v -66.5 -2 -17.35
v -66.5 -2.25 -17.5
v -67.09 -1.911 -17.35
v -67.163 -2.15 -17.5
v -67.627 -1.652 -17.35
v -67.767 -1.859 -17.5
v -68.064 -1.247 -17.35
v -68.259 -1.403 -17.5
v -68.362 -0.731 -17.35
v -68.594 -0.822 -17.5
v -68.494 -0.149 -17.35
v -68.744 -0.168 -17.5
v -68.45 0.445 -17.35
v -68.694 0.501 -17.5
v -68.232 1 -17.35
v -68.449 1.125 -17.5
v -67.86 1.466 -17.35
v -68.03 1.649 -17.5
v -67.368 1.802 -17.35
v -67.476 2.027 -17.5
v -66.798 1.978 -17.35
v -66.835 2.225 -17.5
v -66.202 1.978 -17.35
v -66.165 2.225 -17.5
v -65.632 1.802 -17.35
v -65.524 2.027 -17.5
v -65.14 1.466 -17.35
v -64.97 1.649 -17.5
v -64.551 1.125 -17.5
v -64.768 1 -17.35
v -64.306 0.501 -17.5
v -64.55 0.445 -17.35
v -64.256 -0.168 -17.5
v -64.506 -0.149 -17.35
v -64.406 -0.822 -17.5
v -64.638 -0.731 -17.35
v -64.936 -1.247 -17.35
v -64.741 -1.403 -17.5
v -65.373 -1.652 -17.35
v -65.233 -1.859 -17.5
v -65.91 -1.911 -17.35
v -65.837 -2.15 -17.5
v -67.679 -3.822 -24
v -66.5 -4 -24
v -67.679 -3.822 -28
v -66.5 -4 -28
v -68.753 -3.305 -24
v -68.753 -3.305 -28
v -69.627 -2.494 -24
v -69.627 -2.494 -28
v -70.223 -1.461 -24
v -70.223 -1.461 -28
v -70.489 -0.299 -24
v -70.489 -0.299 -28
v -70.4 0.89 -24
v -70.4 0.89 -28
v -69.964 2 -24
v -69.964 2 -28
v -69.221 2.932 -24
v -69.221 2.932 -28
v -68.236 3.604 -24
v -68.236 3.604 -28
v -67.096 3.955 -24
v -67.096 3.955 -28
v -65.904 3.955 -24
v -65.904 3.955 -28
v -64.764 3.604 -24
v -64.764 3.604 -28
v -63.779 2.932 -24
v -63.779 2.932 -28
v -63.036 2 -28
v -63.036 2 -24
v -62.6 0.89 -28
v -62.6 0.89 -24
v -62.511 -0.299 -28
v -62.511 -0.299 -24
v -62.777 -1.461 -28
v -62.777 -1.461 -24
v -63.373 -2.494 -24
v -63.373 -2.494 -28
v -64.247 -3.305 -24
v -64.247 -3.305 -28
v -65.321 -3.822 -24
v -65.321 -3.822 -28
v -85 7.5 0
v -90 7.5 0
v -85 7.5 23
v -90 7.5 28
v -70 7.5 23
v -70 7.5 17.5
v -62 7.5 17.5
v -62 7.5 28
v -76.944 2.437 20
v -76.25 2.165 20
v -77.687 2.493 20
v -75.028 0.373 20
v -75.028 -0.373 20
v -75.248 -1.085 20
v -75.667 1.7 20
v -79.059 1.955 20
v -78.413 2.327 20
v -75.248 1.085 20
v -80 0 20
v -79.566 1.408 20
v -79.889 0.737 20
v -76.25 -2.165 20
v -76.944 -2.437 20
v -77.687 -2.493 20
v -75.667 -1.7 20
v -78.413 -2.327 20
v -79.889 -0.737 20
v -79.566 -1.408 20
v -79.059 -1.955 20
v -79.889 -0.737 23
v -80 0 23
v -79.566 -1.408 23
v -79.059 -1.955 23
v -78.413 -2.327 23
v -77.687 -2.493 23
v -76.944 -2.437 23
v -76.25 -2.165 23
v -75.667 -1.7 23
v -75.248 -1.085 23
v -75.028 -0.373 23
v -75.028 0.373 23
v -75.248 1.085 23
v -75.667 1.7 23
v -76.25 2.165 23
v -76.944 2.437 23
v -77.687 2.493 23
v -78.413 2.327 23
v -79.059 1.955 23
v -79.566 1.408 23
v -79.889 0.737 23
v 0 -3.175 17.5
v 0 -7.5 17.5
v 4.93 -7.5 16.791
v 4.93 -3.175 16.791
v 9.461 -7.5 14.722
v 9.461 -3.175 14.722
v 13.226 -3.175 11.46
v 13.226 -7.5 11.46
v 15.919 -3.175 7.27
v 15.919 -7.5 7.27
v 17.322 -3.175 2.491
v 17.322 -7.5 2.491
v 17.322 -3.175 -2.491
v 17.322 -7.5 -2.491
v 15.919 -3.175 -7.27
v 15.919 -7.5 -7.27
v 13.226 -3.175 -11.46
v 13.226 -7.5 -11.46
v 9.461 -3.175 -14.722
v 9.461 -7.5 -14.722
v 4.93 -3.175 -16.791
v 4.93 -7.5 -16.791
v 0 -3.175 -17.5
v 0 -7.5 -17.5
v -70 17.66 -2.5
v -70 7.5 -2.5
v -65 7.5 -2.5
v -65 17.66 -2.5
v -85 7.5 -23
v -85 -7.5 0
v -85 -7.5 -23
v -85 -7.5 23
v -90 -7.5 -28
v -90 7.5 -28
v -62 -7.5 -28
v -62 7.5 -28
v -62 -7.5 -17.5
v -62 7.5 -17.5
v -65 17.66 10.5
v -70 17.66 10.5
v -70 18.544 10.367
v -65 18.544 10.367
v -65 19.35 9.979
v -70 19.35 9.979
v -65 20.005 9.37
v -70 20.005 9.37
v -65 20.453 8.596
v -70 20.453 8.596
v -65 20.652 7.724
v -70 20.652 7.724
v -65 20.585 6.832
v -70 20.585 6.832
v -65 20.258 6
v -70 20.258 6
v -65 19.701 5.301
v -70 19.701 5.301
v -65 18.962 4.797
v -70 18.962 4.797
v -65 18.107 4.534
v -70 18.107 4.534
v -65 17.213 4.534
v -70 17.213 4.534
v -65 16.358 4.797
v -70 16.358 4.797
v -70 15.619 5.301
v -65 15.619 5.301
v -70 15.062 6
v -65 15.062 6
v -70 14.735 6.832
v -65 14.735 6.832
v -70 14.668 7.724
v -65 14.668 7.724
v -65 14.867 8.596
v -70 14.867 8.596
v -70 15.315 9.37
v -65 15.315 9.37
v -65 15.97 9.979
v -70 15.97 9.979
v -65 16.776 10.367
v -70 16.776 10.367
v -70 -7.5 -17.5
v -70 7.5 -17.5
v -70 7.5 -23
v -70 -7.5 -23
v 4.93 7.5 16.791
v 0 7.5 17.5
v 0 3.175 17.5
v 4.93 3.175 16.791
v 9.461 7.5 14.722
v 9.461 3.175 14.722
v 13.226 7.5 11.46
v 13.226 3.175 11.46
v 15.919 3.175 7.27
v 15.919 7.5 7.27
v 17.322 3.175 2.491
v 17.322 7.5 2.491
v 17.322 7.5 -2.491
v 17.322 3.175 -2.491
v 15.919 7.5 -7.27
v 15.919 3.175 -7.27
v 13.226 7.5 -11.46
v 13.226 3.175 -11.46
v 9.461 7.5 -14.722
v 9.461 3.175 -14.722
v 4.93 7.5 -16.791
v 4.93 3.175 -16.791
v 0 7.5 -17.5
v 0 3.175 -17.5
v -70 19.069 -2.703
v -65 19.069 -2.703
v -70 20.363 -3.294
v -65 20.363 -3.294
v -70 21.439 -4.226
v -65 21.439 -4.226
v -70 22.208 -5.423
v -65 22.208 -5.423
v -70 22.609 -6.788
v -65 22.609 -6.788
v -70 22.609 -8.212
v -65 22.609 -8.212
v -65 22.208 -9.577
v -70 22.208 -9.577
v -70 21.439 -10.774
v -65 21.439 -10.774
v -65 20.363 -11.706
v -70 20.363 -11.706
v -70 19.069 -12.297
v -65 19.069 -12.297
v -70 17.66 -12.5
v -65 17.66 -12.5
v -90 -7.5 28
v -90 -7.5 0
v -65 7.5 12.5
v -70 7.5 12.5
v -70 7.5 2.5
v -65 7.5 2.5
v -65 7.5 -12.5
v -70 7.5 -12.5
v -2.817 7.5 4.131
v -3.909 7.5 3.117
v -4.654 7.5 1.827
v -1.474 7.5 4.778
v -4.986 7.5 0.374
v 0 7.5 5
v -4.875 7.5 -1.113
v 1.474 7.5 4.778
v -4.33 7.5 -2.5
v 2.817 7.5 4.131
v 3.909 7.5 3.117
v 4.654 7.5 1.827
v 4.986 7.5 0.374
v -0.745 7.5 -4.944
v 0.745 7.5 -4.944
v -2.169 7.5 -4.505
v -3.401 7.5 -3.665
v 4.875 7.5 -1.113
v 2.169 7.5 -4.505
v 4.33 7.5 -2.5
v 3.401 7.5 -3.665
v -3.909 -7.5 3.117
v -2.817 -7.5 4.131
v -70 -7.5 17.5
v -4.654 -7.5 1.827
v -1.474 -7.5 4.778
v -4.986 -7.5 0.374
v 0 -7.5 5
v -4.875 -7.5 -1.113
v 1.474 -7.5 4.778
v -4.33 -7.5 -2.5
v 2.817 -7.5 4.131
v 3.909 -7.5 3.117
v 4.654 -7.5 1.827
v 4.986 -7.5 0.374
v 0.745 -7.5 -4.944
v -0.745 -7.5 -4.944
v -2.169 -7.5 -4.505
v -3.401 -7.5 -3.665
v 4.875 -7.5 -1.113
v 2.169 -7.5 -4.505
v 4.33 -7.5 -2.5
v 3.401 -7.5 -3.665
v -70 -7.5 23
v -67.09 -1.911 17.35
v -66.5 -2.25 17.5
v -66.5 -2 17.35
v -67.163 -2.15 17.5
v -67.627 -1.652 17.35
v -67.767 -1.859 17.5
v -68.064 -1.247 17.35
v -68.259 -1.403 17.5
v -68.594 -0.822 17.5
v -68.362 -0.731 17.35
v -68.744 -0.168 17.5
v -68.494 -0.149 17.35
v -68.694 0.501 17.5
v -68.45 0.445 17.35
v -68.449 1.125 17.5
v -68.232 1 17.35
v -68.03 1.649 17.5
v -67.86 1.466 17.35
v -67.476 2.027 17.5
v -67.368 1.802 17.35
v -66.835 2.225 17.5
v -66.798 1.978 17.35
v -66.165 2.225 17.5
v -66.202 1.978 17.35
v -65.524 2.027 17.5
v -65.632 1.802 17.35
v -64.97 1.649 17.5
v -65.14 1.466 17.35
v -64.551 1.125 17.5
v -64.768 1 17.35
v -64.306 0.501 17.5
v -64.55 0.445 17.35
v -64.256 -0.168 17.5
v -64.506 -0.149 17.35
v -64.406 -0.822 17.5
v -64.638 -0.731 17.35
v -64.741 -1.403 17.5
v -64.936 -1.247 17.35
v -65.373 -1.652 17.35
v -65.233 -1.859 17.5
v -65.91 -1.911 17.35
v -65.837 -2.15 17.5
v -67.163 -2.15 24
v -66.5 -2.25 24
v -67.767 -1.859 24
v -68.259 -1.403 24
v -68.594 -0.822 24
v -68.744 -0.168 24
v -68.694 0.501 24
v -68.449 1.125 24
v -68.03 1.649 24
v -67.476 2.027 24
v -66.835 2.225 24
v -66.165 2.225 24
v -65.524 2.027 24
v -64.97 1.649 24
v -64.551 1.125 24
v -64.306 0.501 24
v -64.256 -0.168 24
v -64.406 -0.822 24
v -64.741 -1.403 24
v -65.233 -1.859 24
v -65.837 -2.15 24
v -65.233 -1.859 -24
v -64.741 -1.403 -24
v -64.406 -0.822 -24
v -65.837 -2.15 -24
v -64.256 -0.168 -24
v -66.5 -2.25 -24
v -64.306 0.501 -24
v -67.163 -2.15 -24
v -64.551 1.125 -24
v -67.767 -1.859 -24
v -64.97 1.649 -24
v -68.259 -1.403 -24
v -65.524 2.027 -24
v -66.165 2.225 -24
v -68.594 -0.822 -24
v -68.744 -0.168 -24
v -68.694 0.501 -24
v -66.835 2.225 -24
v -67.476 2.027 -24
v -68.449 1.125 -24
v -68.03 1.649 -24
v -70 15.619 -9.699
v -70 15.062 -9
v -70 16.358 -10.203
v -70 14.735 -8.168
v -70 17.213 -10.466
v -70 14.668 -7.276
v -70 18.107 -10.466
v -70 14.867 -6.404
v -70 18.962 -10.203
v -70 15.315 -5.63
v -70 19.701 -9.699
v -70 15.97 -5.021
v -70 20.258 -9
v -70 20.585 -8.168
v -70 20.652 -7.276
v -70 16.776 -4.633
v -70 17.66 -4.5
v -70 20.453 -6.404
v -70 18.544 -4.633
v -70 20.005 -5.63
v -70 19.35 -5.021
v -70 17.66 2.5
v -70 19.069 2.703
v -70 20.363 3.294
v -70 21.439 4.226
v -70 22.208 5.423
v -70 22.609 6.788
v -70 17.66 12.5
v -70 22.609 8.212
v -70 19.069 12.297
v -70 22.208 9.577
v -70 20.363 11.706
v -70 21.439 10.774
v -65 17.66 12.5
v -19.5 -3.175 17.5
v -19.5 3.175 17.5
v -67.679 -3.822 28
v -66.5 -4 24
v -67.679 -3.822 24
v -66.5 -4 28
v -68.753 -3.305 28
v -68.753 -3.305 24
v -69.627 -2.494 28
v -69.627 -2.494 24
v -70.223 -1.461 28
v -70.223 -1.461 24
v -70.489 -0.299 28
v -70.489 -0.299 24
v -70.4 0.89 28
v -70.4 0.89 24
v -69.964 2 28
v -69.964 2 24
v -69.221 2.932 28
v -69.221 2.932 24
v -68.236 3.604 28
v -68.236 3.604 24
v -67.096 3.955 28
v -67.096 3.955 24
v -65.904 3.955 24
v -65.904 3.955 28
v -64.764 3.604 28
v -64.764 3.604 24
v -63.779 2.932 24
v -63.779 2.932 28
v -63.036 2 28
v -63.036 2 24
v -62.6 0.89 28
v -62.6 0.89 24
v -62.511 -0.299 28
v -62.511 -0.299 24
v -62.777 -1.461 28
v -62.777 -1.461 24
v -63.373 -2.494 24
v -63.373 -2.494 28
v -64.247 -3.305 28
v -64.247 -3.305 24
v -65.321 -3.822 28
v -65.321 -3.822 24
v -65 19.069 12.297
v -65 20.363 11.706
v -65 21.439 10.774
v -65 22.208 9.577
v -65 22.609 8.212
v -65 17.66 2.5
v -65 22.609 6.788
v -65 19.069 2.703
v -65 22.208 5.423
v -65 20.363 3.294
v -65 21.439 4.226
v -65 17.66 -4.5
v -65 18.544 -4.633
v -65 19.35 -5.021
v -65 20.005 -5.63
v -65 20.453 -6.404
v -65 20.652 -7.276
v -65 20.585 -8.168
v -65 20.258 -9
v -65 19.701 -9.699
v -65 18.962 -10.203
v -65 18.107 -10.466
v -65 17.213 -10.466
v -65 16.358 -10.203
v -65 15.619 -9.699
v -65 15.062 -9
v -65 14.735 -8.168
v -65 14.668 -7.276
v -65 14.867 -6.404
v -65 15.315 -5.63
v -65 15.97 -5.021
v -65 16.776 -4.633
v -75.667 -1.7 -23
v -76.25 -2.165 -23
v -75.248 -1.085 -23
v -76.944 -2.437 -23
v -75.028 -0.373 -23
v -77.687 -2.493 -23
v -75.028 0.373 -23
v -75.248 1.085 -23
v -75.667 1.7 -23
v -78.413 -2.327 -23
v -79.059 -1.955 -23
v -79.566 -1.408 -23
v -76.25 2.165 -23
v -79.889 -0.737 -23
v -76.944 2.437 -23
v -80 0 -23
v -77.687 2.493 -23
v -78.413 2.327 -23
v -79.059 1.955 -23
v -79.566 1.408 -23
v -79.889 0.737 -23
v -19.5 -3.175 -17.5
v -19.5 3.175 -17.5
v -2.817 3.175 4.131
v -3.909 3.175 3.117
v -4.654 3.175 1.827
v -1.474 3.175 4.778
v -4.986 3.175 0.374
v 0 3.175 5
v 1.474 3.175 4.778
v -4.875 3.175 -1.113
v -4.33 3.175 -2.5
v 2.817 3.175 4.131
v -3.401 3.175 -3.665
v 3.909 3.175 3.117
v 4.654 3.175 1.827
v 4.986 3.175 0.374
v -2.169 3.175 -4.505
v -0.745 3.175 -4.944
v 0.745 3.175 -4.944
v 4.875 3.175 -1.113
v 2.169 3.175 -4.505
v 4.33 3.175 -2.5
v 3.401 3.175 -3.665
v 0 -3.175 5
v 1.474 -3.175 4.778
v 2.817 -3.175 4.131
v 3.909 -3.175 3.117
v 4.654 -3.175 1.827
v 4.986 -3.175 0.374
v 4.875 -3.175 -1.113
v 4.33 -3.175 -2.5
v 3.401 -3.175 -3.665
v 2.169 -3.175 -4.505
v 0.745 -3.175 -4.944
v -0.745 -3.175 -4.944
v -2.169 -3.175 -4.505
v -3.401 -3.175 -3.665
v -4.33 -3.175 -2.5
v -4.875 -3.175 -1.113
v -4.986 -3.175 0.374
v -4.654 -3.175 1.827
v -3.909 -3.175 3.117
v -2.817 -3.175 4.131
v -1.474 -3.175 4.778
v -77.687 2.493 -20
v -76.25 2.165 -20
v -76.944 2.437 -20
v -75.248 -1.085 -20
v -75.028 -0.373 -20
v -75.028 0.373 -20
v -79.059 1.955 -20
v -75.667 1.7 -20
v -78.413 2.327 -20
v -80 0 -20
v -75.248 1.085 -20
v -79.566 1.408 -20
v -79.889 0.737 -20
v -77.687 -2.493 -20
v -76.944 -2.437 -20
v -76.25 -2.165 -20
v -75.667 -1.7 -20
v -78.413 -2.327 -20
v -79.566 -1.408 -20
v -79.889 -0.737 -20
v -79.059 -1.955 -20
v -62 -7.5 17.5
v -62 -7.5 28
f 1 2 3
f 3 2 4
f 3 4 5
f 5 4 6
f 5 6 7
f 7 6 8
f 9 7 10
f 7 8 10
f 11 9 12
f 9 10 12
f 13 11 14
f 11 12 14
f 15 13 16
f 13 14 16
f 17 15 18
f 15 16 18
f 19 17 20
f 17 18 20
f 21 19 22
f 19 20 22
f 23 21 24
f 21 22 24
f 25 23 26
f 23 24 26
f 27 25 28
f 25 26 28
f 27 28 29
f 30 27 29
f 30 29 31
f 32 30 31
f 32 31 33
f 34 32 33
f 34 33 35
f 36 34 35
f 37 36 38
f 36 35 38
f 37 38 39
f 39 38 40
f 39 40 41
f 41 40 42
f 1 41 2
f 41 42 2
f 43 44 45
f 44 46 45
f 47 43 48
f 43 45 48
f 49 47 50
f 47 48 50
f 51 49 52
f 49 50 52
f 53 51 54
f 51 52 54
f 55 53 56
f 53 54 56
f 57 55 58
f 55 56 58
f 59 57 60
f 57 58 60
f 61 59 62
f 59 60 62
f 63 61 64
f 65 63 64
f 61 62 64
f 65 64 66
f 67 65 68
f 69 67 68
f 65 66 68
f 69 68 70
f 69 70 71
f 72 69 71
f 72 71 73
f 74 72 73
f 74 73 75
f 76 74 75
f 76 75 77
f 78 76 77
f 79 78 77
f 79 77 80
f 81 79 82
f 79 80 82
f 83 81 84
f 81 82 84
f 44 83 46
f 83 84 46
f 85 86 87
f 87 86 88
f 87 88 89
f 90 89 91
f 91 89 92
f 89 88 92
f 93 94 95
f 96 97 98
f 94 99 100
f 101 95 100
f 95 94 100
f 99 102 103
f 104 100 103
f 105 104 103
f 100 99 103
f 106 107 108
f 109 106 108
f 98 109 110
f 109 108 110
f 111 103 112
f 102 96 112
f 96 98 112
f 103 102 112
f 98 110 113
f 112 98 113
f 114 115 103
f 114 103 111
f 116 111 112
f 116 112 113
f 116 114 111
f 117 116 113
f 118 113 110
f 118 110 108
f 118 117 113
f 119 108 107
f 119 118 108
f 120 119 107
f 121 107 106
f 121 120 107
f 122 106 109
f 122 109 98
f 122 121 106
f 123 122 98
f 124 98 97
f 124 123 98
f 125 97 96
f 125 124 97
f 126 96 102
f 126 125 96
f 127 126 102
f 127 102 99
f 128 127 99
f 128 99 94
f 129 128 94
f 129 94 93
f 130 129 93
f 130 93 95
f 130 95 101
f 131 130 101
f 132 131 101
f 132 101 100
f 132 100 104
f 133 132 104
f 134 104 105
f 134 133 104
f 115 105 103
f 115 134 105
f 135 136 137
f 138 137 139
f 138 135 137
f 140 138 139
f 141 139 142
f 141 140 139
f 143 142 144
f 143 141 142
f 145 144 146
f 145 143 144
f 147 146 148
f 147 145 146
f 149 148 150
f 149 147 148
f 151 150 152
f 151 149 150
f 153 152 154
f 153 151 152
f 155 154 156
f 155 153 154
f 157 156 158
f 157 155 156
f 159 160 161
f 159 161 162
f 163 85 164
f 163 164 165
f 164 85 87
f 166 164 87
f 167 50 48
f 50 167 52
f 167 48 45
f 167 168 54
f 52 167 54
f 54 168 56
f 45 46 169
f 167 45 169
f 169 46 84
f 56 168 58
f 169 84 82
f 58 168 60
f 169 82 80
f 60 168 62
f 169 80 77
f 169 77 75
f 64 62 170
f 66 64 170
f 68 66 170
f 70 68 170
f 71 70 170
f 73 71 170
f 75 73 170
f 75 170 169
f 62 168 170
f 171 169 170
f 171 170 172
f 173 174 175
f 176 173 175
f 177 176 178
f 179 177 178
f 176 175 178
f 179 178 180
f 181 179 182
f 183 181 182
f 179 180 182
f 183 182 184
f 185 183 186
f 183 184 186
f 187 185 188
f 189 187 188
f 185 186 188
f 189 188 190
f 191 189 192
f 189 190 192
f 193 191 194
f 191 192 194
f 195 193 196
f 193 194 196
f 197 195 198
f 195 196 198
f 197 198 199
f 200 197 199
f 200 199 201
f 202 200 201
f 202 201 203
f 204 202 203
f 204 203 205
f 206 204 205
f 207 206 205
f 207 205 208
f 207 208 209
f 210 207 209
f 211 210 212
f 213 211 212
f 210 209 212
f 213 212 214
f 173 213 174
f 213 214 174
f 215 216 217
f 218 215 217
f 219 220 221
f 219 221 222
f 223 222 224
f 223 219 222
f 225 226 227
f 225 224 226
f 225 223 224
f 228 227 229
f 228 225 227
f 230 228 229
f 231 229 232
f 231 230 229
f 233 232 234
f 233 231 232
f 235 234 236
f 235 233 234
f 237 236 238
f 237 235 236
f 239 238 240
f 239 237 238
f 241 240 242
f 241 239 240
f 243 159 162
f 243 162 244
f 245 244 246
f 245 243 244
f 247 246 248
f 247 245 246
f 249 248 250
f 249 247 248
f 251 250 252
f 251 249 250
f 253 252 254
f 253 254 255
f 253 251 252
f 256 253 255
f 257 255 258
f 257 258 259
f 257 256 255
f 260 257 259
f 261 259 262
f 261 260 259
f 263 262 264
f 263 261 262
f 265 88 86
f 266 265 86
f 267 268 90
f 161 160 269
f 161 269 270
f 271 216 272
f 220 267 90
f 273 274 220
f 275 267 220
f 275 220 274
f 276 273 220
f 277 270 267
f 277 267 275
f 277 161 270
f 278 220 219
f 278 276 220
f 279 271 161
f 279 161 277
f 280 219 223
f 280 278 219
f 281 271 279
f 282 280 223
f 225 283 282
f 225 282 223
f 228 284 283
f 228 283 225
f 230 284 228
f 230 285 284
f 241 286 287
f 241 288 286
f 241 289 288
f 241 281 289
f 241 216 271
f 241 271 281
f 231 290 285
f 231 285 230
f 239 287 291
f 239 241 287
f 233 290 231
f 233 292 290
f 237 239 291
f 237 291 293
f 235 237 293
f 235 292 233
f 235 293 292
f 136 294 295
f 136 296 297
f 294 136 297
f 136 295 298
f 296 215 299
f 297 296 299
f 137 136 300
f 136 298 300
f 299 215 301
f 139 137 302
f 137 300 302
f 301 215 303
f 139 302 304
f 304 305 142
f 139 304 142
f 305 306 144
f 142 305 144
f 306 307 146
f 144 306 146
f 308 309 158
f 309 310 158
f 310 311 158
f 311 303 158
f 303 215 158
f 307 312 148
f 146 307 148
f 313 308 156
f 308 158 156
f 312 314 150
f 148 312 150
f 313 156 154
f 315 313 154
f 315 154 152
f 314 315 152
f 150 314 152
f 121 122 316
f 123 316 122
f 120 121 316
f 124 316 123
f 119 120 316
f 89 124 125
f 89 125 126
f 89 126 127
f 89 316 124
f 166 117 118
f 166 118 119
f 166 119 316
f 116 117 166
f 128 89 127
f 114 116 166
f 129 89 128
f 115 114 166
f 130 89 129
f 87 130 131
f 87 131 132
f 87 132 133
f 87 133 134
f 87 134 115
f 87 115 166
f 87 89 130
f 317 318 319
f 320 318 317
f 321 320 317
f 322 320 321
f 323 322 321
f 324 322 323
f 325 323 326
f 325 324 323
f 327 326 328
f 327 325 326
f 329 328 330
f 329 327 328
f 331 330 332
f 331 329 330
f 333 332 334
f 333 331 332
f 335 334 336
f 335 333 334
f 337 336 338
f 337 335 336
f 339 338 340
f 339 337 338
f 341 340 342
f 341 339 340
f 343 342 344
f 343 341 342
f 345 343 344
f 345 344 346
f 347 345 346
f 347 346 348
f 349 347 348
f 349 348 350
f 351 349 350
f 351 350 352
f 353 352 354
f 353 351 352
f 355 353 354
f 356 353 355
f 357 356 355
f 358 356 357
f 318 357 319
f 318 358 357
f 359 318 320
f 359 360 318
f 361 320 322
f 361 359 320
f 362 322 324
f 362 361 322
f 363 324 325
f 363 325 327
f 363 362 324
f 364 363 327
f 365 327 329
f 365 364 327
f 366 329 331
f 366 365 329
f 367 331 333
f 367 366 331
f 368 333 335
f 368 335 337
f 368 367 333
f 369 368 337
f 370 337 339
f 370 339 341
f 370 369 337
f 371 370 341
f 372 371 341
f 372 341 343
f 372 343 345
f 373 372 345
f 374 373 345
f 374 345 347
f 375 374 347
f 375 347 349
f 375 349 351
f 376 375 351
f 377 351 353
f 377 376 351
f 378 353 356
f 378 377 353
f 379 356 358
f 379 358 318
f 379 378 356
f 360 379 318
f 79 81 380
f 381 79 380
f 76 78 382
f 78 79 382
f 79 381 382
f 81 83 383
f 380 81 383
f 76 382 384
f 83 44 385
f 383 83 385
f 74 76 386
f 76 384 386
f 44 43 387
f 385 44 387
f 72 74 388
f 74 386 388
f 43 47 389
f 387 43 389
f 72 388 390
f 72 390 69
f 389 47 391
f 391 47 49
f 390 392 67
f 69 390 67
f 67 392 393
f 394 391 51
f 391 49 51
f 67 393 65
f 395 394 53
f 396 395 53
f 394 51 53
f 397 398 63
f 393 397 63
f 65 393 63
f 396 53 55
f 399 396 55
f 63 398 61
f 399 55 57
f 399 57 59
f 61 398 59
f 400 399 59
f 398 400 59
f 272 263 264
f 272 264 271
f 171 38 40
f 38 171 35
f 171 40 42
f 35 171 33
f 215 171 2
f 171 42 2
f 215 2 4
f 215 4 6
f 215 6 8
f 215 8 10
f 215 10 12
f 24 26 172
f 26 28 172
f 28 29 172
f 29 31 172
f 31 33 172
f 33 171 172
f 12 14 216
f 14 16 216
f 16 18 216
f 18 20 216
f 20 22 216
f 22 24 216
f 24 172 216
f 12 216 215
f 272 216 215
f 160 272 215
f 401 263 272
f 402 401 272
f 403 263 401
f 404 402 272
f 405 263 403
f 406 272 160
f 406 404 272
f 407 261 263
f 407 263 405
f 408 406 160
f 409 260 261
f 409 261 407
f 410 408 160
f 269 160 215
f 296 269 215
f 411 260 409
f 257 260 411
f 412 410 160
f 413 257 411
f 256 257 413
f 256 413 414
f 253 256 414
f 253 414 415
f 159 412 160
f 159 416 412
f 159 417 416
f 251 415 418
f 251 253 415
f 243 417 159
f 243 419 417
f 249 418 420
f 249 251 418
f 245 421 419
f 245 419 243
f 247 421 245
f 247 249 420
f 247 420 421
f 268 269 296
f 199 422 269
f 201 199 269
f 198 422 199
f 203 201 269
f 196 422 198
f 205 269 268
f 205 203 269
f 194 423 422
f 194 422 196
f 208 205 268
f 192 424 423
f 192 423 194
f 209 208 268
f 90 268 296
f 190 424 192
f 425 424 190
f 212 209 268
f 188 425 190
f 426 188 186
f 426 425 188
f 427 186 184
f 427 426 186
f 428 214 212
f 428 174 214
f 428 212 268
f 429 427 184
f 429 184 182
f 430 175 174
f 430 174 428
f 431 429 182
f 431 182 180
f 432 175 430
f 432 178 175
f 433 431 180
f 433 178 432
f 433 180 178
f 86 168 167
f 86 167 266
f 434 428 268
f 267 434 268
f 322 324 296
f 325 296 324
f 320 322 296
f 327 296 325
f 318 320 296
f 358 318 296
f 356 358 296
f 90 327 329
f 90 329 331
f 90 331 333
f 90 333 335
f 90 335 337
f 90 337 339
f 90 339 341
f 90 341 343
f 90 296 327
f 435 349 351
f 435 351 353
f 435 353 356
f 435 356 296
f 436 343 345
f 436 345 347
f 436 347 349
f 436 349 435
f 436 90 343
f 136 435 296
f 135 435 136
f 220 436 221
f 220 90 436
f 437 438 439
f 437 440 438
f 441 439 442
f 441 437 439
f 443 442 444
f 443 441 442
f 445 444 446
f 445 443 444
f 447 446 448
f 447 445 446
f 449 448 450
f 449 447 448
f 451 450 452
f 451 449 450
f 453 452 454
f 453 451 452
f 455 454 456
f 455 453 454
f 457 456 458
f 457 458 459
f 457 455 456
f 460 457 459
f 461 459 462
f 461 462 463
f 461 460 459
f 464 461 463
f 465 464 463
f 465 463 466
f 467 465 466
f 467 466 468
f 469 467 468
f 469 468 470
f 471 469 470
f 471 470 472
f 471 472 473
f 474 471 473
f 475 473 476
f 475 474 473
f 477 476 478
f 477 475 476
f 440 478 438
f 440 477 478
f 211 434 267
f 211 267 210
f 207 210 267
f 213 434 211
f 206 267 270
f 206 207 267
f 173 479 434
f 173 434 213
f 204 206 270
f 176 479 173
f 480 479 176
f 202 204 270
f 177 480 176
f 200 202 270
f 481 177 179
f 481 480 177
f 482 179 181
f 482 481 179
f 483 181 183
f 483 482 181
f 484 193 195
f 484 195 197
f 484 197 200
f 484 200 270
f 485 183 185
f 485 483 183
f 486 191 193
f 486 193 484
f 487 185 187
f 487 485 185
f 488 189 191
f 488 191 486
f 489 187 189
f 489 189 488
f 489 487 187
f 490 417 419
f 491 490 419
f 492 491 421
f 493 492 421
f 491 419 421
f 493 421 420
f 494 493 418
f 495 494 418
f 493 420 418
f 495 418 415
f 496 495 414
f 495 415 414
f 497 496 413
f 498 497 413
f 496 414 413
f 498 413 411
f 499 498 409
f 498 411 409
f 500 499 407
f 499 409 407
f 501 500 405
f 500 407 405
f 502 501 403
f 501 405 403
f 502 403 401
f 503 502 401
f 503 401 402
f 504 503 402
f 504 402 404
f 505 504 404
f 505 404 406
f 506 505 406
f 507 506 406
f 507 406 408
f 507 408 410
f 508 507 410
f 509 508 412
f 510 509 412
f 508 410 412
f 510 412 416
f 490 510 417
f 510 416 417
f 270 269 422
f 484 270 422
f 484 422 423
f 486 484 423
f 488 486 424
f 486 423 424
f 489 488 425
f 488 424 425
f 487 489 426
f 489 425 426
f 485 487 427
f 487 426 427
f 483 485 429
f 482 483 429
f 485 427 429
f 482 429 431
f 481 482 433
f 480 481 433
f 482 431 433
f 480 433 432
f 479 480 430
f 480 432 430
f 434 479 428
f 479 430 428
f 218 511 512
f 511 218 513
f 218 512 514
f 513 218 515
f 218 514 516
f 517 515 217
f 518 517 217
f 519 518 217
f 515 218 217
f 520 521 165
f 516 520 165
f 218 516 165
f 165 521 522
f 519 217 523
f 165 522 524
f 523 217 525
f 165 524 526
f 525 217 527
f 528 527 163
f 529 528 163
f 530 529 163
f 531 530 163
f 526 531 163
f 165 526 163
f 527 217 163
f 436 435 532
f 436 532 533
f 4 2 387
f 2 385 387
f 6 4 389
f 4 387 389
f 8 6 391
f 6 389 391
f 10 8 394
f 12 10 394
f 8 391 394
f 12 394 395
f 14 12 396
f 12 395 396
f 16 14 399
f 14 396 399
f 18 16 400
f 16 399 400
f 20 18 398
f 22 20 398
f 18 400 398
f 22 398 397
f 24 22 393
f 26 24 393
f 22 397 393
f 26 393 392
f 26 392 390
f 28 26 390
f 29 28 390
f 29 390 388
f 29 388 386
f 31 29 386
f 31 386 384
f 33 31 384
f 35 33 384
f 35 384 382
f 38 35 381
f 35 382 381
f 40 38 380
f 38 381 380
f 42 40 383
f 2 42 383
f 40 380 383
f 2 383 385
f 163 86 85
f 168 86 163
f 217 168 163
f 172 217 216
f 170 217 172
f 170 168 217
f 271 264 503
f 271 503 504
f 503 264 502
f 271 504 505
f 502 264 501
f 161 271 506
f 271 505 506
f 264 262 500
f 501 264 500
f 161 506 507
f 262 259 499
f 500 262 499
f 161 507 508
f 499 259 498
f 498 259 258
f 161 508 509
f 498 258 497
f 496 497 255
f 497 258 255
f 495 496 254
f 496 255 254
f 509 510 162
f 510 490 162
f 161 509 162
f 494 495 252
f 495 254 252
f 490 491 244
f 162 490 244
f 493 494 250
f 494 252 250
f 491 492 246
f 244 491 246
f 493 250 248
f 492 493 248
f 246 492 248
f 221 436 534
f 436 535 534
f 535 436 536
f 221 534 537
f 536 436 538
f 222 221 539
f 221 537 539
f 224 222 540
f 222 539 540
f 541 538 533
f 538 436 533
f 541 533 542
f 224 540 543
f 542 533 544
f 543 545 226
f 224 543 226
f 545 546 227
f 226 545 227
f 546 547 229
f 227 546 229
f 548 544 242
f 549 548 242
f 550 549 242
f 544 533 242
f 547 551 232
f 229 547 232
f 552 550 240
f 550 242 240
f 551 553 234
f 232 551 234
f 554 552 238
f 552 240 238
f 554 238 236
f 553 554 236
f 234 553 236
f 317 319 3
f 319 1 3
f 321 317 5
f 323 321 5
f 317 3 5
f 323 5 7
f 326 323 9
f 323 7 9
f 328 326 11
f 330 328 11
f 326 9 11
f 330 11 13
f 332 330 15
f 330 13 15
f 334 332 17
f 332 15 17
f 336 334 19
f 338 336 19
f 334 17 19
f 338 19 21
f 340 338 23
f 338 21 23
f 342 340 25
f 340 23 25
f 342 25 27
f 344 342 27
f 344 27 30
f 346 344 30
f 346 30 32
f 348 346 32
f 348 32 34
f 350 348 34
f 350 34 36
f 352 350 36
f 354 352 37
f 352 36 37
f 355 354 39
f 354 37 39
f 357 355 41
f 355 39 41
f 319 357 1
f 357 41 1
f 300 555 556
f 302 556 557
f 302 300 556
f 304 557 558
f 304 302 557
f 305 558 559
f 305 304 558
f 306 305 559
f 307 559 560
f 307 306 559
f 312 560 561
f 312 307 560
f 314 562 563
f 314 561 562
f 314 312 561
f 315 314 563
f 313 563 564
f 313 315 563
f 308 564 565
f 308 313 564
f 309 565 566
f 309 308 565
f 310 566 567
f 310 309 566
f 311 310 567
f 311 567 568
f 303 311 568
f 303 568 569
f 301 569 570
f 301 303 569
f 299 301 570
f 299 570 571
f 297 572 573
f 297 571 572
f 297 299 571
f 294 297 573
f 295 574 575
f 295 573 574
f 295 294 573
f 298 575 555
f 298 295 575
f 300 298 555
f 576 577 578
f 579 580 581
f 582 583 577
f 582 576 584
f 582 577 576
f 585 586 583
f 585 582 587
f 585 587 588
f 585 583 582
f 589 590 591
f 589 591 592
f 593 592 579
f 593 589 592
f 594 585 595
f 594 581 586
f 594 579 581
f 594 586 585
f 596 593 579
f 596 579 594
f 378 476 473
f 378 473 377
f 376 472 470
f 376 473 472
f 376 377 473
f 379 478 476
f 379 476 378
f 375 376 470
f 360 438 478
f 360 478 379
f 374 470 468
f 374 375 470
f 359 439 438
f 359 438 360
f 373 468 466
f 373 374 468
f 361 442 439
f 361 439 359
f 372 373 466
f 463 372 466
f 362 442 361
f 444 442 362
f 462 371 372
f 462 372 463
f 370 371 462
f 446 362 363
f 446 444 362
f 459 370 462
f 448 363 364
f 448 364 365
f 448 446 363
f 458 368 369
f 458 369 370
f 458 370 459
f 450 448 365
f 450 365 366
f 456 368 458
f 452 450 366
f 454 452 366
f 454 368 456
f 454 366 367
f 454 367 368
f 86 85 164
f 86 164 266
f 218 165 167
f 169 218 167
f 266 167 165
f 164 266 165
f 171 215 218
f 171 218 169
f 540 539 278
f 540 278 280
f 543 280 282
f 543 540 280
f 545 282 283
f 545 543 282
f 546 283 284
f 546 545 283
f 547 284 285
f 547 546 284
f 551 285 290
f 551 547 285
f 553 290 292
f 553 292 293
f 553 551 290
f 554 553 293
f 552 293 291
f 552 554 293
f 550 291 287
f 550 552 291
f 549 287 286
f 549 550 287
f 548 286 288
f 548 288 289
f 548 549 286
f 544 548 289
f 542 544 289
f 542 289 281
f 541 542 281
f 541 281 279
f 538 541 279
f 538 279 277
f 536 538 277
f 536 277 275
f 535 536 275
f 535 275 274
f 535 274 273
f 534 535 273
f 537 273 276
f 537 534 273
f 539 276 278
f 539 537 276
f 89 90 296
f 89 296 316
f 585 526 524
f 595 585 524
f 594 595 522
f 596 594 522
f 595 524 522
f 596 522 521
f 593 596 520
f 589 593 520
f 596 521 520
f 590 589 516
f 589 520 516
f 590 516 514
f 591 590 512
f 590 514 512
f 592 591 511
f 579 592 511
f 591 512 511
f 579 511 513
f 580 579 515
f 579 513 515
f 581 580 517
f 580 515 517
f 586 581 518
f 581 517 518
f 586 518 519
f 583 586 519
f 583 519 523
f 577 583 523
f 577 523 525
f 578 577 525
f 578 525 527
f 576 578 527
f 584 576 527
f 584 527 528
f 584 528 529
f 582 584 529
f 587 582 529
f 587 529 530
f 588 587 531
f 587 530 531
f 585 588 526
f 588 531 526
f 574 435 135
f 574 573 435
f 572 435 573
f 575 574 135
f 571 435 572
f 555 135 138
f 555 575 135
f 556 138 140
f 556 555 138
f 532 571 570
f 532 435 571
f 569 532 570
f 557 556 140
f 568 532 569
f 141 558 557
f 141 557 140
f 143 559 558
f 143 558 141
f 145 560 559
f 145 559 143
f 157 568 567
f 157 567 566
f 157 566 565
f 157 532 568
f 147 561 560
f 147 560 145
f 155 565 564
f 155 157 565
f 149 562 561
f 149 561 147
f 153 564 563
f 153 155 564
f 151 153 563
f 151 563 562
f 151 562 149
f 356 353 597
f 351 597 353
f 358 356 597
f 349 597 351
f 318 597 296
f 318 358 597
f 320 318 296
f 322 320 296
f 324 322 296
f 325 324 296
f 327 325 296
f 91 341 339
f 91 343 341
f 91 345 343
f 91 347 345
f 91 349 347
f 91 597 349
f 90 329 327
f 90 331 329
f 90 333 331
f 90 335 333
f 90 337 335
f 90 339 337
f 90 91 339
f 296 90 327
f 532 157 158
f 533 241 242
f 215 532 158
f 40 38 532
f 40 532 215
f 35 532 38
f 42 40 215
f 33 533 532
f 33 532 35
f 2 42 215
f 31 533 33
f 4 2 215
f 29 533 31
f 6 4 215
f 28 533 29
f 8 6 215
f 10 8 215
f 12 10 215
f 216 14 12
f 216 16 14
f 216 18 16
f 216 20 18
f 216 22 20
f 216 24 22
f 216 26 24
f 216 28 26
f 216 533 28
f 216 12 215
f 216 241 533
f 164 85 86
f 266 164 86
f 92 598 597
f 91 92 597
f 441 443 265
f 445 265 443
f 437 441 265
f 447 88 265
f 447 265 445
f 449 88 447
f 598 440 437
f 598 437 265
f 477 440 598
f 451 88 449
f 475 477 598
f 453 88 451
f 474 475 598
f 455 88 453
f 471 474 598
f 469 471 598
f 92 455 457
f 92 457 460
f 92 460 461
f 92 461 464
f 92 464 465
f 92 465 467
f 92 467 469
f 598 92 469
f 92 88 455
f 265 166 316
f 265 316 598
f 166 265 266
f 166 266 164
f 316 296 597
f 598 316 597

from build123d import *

# Parameters (mm, degrees)
SKETCH1_R                       = 5
BOSS_EXTRUDE2_DEPTH             = 7.5
CUT_EXTRUDE2_DEPTH              = 73.543090643
CUT_EXTRUDE2_DEPTH_BACK         = 73.543090643
SKETCH4_W                       = 37
SKETCH4_H                       = 6.35
SKETCH6_R                       = 3
BOSS_EXTRUDE5_DEPTH             = 5
BOSS_EXTRUDE6_REACH             = 77.629
BOSS_EXTRUDE6_DIRECTION_2_REACH = 77.629
SKETCH9_R                       = 2.5
BOSS_EXTRUDE7_DEPTH             = 3
SKETCH15_W                      = 2
SKETCH15_H                      = 45.5


with BuildPart() as part:
    # Sketch1 → Boss-Extrude2 (new, symmetric)
    with BuildSketch(Plane(origin=(0, 0, 0), x_dir=(1, 0, 0), z_dir=(0, 1, 0))):
        with BuildLine():
            Line((0, 17.5), (-70, 17.5))
            Line((-70, 17.5), (-70, -17.5))
            Line((-70, -17.5), (0, -17.5))
            ThreePointArc((0, -17.5), (17.5, 0), (0, 17.5))
        make_face()
        with Locations(Location((0, 0, 0), (0, 0, 270))):
            Circle(SKETCH1_R, mode=Mode.SUBTRACT)
    extrude(amount=BOSS_EXTRUDE2_DEPTH, both=True)

    # Sketch4 → Cut-Extrude2 (cut, two sides: drawn at the far end of the back side and taken through both)
    with BuildSketch(Plane.XY.offset(-CUT_EXTRUDE2_DEPTH_BACK)):
        with Locations((-1, 0)):
            Rectangle(SKETCH4_W, SKETCH4_H)
    extrude(amount=CUT_EXTRUDE2_DEPTH + CUT_EXTRUDE2_DEPTH_BACK, mode=Mode.SUBTRACT)

    # Sketch6 → Boss-Extrude5 (add)
    # profile 1 of 2: a face of its own
    with BuildSketch(Plane.ZY.offset(70)):
        with BuildLine():
            Line((-12.5, 7.5), (-2.5, 7.5))
            Line((-2.5, 7.5), (-2.5, 17.66))
            ThreePointArc((-2.5, 17.66), (-7.5, 22.66), (-12.5, 17.66))
            Line((-12.5, 17.66), (-12.5, 7.5))
        make_face()
        with Locations((-7.5, 17.66)):
            Circle(SKETCH6_R, mode=Mode.SUBTRACT)
    # profile 2 of 2: a face of its own
    with BuildSketch(Plane.ZY.offset(70)):
        with BuildLine():
            Line((12.5, 7.5), (2.5, 7.5))
            Line((2.5, 7.5), (2.5, 17.66))
            ThreePointArc((2.5, 17.66), (7.5, 22.66), (12.5, 17.66))
            Line((12.5, 17.66), (12.5, 7.5))
        make_face()
        with Locations((7.5, 17.66)):
            Circle(SKETCH6_R, mode=Mode.SUBTRACT)
    extrude(amount=-BOSS_EXTRUDE5_DEPTH)


with BuildPart() as body_2:

    # Boss-Extrude6: up to this face of the body (flat: up to its plane)
    boss_extrude6_end = Plane(part.part.faces().sort_by_distance((-27.402953524, 7.5, 0))[0])
    # Sketch8 → Boss-Extrude6 (new, up to the picked face)
    with BuildSketch(Plane(origin=(0, 0, 0), x_dir=(1, 0, 0), z_dir=(0, 1, 0)), mode=Mode.PRIVATE) as boss_extrude6_sk1:
        Polygon((-62, 17.5), (-70, 17.5), (-70, 23), (-85, 23), (-85, 17.5), (-85, 0), (-90, 0), (-90, 17.5), (-90, 28), (-62, 28), align=None)
    boss_extrude6_tool1 = split(extrude(boss_extrude6_sk1.sketch, amount=BOSS_EXTRUDE6_REACH, mode=Mode.PRIVATE), bisect_by=boss_extrude6_end, keep=Keep.BOTH, mode=Mode.PRIVATE)
    add(boss_extrude6_tool1.solids().sort_by(Axis((-66, 0, -17.89598), (0, 1, 0)))[0])


    # Boss-Extrude6 direction 2: up to this face of the body (flat: up to its plane)
    boss_extrude6_direction_2_end = Plane(part.part.faces().sort_by_distance((-28.808626222, -7.5, 0))[0])
    # Sketch8 → Boss-Extrude6 direction 2 (add, up to the picked face)
    with BuildSketch(Plane(origin=(0, 0, 0), x_dir=(1, 0, 0), z_dir=(0, 1, 0)), mode=Mode.PRIVATE) as boss_extrude6_direction_2_sk1:
        Polygon((-62, 17.5), (-70, 17.5), (-70, 23), (-85, 23), (-85, 17.5), (-85, 0), (-90, 0), (-90, 17.5), (-90, 28), (-62, 28), align=None)
    boss_extrude6_direction_2_tool1 = split(extrude(boss_extrude6_direction_2_sk1.sketch, amount=-BOSS_EXTRUDE6_DIRECTION_2_REACH, mode=Mode.PRIVATE), bisect_by=boss_extrude6_direction_2_end, keep=Keep.BOTH, mode=Mode.PRIVATE)
    add(boss_extrude6_direction_2_tool1.solids().sort_by(Axis((-66, 0, -17.89598), (0, -1, 0)))[0])

    # Sketch9 → Boss-Extrude7 (add)
    with BuildSketch(Plane.XY.offset(-23)):
        with Locations(Location((-77.5, 0, 0), (0, 0, 180))):
            Circle(SKETCH9_R)
    extrude(amount=BOSS_EXTRUDE7_DEPTH)


with BuildPart() as body_3:
    # Mirror3: mirrored copy
    add(body_2.part.mirror(Plane.XY))


with BuildPart() as cbore_for_m4_shcs1_tool:
    # Sketch13 → CBORE for M4 SHCS1 (revolve)
    with BuildSketch(Plane(origin=(-66.5, 0, 28), x_dir=(0, -1, 0), z_dir=(1, 0, 0))):
        Polygon((0, 0), (0, 11.851936393), (2.25, 10.5), (2.25, 4), (4, 4), (4, 0), align=None)
    cbore_for_m4_shcs1 = revolve(axis=Axis((-66.5, 0, 34.35), (0, 0, -1)))


with BuildPart() as part_1:
    add(part.part)

    # CBORE for M4 SHCS1: cut by cbore_for_m4_shcs1_tool
    add(cbore_for_m4_shcs1_tool.part, mode=Mode.SUBTRACT)


with BuildPart() as body_3_1:
    add(body_3.part)

    # CBORE for M4 SHCS1: cut by cbore_for_m4_shcs1_tool
    add(cbore_for_m4_shcs1_tool.part, mode=Mode.SUBTRACT)


with BuildPart() as mirror5_tool:
    # Mirror5: CBORE for M4 SHCS1 across plane
    add(cbore_for_m4_shcs1.mirror(Plane.XY))


with BuildPart() as part_2:
    add(part_1.part)

    # Mirror5: cut by mirror5_tool
    add(mirror5_tool.part, mode=Mode.SUBTRACT)

    # Sketch15 → Ø4.0mm Dowel Hole1 (revolve, cut)
    with BuildSketch(Plane(origin=(-66.5, 0, 17.5), x_dir=(0, -1, 0), z_dir=(1, 0, 0))):
        with Locations((1, 22.75)):
            Rectangle(SKETCH15_W, SKETCH15_H)
    revolve(axis=Axis((-66.5, 0, 23.85), (0, 0, -1)), mode=Mode.SUBTRACT)


with BuildPart() as body_2_1:
    add(body_2.part)

    # Mirror5: cut by mirror5_tool
    add(mirror5_tool.part, mode=Mode.SUBTRACT)


solid = Compound([body_3_1.part, part_2.part, body_2_1.part])
